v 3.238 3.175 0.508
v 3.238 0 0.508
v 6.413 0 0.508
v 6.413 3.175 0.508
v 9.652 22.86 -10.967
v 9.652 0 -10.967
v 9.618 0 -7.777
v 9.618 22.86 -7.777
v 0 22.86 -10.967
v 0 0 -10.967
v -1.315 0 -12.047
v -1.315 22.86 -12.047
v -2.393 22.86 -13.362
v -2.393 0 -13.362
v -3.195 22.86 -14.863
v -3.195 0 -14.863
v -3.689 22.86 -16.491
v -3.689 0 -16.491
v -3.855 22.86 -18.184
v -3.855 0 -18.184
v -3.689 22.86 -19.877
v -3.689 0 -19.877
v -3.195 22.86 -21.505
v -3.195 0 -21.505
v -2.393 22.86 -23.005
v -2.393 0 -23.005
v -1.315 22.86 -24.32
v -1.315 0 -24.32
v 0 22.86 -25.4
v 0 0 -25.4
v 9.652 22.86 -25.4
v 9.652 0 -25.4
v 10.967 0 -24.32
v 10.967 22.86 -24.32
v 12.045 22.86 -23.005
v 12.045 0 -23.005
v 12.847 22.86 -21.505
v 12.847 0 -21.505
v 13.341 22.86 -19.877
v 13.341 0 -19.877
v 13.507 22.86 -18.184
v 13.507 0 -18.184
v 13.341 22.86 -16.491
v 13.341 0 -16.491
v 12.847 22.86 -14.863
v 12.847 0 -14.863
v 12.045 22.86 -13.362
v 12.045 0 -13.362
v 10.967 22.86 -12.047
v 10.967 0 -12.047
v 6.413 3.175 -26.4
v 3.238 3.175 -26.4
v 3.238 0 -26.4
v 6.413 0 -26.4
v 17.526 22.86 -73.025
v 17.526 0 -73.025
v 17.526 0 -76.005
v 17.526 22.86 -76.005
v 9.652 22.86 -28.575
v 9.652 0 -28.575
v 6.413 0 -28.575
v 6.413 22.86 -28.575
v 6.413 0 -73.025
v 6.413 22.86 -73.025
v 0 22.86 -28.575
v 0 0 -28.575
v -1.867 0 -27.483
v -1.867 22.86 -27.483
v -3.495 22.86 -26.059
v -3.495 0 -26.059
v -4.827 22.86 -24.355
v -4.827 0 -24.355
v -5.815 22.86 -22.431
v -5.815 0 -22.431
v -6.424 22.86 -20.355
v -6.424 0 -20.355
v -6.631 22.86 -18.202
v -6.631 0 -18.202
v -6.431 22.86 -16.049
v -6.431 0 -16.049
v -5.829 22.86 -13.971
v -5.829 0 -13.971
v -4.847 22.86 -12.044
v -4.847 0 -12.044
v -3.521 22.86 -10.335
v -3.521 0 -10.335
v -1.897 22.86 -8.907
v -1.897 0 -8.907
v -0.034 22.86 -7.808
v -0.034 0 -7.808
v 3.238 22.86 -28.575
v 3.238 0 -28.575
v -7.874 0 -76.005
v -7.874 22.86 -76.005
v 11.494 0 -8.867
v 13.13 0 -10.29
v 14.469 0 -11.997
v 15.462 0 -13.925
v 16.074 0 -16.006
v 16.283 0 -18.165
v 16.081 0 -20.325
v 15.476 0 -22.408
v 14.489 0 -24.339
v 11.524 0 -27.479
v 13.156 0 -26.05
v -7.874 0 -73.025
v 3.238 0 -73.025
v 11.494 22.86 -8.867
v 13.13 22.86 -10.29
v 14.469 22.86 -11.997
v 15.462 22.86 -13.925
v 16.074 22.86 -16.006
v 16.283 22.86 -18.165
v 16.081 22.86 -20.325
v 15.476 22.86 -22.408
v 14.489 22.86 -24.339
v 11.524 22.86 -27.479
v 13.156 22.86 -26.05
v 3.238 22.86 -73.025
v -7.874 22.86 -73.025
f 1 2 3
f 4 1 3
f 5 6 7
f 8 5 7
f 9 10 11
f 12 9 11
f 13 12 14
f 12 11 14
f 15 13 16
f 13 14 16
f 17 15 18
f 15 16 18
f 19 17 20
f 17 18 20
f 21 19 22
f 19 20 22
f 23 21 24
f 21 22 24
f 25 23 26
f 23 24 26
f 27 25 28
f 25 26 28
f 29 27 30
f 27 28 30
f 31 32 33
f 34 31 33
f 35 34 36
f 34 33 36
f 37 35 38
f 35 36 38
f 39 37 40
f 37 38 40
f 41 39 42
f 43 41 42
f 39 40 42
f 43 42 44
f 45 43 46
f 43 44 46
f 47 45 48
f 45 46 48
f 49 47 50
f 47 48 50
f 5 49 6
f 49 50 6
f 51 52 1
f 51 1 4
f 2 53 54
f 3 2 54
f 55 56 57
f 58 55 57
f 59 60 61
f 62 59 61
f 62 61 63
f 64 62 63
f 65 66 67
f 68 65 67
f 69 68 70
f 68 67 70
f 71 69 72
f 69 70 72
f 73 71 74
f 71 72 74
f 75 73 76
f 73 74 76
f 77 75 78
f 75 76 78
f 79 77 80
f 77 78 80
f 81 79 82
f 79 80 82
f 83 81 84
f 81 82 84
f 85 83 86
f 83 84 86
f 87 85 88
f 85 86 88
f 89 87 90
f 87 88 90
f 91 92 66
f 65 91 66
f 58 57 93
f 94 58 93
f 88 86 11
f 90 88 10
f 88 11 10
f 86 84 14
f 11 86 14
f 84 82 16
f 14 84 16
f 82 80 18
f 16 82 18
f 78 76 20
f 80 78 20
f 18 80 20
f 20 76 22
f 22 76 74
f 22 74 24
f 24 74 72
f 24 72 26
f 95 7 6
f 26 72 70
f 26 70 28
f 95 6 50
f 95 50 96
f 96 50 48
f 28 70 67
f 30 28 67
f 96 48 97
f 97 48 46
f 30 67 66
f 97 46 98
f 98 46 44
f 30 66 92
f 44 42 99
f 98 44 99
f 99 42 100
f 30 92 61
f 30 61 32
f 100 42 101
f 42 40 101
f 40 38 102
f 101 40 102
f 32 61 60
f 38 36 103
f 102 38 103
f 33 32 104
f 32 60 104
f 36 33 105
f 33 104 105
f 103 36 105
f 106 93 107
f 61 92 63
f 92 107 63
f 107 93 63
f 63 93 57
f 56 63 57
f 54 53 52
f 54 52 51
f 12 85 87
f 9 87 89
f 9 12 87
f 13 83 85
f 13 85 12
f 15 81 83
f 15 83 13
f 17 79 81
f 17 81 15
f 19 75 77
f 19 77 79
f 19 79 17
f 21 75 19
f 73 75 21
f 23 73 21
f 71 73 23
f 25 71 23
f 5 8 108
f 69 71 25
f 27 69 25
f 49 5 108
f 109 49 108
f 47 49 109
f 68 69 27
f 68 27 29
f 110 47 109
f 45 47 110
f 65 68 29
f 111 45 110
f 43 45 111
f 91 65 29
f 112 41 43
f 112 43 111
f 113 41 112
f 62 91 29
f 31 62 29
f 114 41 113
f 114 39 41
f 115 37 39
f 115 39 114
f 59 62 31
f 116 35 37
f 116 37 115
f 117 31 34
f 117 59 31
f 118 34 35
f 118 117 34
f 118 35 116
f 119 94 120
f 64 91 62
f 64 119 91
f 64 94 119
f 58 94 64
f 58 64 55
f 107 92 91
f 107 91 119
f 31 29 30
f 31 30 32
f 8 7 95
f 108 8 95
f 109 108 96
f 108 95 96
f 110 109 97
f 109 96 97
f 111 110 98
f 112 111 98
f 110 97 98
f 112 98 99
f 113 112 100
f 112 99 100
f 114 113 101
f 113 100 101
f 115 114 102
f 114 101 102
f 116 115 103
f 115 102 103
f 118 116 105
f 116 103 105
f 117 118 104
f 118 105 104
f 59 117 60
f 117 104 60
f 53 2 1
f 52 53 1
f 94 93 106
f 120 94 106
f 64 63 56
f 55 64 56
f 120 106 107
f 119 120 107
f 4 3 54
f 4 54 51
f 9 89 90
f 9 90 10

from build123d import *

# Parameters (mm, degrees)
SKETCH1_W                = 3.175
SKETCH1_H                = 44.45
BOSS_EXTRUDE1_DEPTH      = 22.86
SKETCH2_W                = 3.175
SKETCH2_H                = 3.175
BOSS_EXTRUDE2_DEPTH      = 0.508
BOSS_EXTRUDE2_DEPTH_BACK = 26.399527316


with BuildPart() as part:
    # Sketch1 → Boss-Extrude1 (new body)
    with BuildSketch(Plane(origin=(0, 0, 0), x_dir=(1, 0, 0), z_dir=(0, 1, 0))):
        with BuildLine():
            ThreePointArc((9.652, 25.4), (13.507299945, 18.183720298), (9.652, 10.967440596))
            Line((9.652, 10.967440596), (9.61840611, 7.776904574))
            ThreePointArc((9.61840611, 7.776904574), (16.283252173, 18.1652141), (9.652, 28.575))
            Line((9.652, 28.575), (9.652, 25.4))
        make_face()
        Polygon((0, 25.4), (9.652, 25.4), (9.652, 28.575), (6.4135, 28.575), (3.2385, 28.575), (0, 28.575), align=None)
        with BuildLine():
            ThreePointArc((0, 10.967440596), (-3.855299945, 18.183720298), (0, 25.4))
            Line((0, 25.4), (0, 28.575))
            ThreePointArc((0, 28.575), (-6.631251767, 18.202476563), (-0.03399644, 7.808297201))
            Line((-0.03399644, 7.808297201), (0, 10.967440596))
        make_face()
        with Locations((4.826, 50.8)):
            Rectangle(SKETCH1_W, SKETCH1_H)
        Polygon((3.2385, 73.025), (6.4135, 73.025), (17.526, 73.025), (17.526, 76.004634154), (-7.874, 76.004634154), (-7.874, 73.025), align=None)
    extrude(amount=BOSS_EXTRUDE1_DEPTH)


with BuildPart() as body_2:
    # Sketch2 → Boss-Extrude2 (new body, two sides)
    with BuildSketch(Plane.XY) as boss_extrude2_sk:
        with Locations((4.826, 1.5875)):
            Rectangle(SKETCH2_W, SKETCH2_H)
    extrude(amount=BOSS_EXTRUDE2_DEPTH)
    extrude(boss_extrude2_sk.sketch, amount=-BOSS_EXTRUDE2_DEPTH_BACK)


solid = Compound([part.part, body_2.part])
